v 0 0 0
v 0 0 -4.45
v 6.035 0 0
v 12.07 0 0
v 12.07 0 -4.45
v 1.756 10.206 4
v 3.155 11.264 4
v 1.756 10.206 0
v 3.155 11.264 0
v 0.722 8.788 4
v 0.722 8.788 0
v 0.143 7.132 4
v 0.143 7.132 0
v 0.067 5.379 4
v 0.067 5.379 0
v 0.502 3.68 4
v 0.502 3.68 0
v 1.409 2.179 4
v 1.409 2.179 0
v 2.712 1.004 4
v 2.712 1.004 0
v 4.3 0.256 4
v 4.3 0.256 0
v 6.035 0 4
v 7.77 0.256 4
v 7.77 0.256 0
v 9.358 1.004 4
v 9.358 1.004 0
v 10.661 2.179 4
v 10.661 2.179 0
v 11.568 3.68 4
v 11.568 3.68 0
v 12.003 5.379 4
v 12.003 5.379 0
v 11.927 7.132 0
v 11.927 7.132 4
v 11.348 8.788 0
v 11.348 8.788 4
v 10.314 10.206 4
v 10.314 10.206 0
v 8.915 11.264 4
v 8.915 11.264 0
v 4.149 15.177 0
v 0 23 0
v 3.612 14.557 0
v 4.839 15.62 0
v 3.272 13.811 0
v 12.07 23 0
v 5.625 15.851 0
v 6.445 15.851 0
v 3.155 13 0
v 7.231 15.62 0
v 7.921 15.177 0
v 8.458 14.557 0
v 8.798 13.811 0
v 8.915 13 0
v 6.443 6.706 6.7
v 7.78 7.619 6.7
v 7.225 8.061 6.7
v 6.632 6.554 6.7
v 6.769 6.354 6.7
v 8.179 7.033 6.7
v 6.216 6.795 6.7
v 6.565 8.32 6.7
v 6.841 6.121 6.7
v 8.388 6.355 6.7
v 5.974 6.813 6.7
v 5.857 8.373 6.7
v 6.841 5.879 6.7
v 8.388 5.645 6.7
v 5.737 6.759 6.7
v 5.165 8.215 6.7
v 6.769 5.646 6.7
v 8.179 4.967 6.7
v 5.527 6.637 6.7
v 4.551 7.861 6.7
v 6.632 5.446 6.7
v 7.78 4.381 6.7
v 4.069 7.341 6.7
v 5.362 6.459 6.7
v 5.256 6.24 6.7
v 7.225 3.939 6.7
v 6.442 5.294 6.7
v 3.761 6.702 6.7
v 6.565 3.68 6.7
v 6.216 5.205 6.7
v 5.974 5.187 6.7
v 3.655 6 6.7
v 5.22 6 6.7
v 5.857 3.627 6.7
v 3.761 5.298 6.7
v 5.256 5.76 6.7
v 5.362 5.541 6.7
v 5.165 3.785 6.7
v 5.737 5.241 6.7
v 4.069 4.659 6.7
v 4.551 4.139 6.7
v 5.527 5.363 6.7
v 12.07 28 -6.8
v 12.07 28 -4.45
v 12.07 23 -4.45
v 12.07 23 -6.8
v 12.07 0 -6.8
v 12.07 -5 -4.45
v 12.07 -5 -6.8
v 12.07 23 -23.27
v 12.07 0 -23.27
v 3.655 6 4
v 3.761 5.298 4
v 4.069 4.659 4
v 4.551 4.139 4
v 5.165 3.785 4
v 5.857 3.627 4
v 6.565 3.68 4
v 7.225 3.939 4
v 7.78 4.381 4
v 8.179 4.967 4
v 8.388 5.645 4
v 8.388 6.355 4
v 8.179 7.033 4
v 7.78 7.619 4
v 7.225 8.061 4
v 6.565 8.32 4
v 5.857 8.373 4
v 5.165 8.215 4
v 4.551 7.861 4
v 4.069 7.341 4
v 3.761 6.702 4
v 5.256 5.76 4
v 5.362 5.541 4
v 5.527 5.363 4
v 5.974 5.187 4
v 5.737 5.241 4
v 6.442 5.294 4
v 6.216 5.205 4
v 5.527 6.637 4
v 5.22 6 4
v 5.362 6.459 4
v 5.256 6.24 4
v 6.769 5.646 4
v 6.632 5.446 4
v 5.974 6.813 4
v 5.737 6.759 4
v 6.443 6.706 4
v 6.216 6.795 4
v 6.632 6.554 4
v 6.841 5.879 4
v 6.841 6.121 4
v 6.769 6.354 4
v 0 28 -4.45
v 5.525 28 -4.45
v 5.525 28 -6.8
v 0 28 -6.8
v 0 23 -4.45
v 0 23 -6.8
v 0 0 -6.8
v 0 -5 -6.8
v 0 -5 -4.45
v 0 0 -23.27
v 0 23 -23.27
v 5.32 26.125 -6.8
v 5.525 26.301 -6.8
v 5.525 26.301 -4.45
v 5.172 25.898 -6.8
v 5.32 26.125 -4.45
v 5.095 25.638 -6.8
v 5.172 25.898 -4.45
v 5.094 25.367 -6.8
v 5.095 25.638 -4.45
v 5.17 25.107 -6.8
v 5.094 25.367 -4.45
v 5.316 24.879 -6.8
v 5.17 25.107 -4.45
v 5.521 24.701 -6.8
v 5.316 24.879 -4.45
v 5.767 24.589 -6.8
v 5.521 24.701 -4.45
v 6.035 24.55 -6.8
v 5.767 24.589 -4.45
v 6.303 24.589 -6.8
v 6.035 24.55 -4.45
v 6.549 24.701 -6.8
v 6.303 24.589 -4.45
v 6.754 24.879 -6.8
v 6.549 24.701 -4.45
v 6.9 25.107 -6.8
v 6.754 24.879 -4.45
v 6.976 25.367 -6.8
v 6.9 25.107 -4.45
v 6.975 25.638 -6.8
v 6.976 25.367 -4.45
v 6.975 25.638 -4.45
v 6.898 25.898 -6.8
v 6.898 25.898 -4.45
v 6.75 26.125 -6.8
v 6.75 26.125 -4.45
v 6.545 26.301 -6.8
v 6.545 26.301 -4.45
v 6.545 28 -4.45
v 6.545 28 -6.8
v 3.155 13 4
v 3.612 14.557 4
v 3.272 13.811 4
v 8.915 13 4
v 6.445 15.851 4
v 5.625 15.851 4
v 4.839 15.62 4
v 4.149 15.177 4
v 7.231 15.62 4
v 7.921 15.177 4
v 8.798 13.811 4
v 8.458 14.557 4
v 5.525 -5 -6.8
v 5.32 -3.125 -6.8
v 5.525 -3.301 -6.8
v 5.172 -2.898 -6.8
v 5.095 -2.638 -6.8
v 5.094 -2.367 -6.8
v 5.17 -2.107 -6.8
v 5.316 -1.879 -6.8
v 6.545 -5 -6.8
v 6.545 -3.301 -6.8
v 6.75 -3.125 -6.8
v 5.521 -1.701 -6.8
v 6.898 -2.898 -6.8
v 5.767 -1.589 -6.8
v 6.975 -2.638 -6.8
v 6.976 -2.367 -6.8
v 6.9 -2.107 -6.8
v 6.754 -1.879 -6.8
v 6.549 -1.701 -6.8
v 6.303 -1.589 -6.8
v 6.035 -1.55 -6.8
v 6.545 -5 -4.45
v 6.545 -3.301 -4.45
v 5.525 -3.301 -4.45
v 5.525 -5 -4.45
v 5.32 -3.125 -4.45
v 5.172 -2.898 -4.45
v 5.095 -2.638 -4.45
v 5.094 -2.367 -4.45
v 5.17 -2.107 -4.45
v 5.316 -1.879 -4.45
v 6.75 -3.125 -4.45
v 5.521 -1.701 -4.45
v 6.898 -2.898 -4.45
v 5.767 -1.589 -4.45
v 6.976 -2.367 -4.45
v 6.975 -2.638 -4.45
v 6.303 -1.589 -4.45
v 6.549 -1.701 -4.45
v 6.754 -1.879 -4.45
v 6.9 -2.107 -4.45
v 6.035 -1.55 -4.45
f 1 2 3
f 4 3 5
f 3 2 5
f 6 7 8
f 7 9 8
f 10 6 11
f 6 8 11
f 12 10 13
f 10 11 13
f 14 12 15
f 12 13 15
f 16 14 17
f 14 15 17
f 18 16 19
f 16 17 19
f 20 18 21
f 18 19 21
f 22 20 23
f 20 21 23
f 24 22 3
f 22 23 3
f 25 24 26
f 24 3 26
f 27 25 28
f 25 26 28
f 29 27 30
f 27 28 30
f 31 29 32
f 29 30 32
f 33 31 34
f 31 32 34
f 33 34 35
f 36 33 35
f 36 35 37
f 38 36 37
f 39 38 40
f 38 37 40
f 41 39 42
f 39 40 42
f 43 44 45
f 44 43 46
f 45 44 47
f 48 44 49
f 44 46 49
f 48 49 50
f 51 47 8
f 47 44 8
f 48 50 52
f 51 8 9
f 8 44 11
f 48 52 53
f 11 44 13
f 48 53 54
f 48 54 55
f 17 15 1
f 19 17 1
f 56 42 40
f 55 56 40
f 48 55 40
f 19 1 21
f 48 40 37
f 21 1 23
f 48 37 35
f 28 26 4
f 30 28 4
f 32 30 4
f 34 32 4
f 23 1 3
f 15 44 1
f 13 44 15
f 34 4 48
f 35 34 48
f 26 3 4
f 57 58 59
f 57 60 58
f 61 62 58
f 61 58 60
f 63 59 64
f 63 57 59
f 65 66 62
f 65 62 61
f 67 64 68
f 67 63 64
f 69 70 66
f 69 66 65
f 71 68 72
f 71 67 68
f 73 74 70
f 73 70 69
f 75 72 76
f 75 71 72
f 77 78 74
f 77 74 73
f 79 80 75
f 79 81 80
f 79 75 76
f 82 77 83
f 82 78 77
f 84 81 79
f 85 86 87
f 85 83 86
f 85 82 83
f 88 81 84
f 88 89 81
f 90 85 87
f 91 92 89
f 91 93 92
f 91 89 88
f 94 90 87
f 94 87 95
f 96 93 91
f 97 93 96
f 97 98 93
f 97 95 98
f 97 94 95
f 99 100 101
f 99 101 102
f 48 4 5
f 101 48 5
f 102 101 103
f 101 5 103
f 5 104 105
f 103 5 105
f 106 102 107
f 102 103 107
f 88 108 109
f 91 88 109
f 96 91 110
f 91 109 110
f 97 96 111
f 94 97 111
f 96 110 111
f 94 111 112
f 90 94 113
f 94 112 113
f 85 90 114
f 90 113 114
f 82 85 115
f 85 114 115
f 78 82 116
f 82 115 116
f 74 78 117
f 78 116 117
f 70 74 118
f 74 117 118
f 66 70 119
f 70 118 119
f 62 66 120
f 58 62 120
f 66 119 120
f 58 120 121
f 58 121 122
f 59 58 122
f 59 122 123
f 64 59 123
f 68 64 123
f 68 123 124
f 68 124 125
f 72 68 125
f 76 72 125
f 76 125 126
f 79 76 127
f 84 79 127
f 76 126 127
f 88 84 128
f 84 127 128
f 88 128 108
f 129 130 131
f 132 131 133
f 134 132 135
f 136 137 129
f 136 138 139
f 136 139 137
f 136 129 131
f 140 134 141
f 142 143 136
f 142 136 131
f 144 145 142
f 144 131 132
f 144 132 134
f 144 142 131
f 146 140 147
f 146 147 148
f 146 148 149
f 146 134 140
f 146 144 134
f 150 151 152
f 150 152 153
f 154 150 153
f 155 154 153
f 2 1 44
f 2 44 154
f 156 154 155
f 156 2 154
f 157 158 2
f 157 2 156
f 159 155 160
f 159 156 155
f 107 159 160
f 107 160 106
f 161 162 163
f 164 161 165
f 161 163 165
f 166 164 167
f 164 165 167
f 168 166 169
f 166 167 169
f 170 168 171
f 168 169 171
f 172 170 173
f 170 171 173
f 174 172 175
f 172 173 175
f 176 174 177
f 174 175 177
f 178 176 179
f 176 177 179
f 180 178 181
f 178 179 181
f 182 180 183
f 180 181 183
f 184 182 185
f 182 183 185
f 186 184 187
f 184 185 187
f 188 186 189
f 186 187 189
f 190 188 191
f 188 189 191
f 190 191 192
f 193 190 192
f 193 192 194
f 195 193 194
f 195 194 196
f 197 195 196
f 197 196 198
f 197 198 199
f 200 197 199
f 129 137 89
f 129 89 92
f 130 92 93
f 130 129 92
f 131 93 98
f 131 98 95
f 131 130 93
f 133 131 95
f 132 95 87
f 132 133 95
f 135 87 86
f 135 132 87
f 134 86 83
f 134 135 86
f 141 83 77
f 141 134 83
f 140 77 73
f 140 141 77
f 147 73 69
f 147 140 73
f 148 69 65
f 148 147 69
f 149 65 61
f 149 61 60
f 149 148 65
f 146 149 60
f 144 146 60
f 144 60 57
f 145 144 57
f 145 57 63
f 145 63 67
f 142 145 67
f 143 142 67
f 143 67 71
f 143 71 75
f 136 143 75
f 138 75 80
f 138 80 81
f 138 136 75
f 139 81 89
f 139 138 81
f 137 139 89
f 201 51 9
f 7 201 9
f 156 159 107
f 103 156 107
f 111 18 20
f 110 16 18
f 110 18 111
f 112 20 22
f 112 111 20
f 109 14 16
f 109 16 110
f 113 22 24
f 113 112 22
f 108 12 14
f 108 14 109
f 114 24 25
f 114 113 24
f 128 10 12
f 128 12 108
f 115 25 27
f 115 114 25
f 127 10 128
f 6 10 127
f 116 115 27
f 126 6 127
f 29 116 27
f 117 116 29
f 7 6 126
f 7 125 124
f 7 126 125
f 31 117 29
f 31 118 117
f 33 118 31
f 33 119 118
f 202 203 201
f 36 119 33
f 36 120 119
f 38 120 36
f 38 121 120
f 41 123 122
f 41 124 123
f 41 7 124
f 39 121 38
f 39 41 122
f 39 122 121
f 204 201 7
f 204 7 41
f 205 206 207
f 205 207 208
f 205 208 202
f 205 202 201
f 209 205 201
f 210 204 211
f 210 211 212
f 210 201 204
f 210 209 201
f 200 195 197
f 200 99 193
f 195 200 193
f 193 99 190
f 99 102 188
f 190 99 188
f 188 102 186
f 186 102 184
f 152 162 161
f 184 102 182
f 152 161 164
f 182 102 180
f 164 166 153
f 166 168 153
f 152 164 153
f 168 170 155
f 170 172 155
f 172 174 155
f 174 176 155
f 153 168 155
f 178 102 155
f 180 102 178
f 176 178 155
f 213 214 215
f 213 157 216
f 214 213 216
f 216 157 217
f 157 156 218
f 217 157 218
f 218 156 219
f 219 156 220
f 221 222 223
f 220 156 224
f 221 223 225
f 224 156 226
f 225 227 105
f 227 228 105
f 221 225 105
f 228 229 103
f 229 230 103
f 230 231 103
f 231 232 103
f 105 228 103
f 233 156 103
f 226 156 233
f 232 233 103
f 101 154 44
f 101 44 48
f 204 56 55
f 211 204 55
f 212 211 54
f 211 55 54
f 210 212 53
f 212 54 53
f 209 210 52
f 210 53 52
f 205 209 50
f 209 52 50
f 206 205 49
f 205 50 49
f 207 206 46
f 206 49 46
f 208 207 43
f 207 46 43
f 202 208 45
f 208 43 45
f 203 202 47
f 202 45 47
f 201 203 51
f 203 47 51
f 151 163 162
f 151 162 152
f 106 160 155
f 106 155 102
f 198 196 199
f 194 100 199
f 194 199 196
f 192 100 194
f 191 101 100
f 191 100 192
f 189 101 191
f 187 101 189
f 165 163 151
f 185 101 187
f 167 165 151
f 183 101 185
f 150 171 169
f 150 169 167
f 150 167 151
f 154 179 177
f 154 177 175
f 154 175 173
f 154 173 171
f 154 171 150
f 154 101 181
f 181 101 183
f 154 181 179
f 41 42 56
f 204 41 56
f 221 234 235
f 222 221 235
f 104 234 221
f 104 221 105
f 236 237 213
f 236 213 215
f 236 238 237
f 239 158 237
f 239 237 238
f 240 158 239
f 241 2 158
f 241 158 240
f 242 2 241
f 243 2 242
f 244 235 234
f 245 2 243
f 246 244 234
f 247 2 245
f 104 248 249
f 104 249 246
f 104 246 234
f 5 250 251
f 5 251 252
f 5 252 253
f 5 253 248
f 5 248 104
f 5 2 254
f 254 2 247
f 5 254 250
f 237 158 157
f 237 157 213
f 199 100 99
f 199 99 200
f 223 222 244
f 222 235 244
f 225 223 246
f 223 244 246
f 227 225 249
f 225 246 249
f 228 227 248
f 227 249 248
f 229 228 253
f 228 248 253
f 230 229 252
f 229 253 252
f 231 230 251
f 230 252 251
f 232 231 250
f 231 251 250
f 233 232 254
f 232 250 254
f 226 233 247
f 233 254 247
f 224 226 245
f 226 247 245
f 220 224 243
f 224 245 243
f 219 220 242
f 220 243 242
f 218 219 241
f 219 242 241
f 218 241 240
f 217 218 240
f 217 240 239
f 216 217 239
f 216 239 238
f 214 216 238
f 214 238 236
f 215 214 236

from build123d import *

# Parameters (mm, degrees)
SKETCH1_W           = 12.07
SKETCH1_H           = 23.27
BOSS_EXTRUDE1_DEPTH = 23
SKETCH2_R           = 6
BOSS_EXTRUDE3_DEPTH = 4
BOSS_EXTRUDE4_DEPTH = 4
SKETCH6_W           = 12.07
SKETCH6_H           = 2.35
BOSS_EXTRUDE5_DEPTH = 5
SKETCH7_W           = 12.07
SKETCH7_H           = 2.35
BOSS_EXTRUDE6_DEPTH = 5
SKETCH8_R           = 0.95
CUT_EXTRUDE1_DEPTH  = 36.831233582
SKETCH9_W           = 1.02
SKETCH9_H           = 2.5
CUT_EXTRUDE2_DEPTH  = 36.831233582
SKETCH10_R          = 2.38
SKETCH10_R_2        = 0.815
BOSS_EXTRUDE7_DEPTH = 2.7


with BuildPart() as part:
    # Sketch1 → Boss-Extrude1 (new body)
    with BuildSketch(Plane(origin=(0, 0, 0), x_dir=(1, 0, 0), z_dir=(0, 1, 0))):
        with Locations((6.035, 11.635)):
            Rectangle(SKETCH1_W, SKETCH1_H)
    extrude(amount=BOSS_EXTRUDE1_DEPTH)

    # Sketch2 → Boss-Extrude3 (add)
    with BuildSketch(Plane.XY):
        with Locations(Location((6.035, 6, 0), (0, 0, 270))):
            Circle(SKETCH2_R)
    extrude(amount=BOSS_EXTRUDE3_DEPTH)

    # Sketch4 → Boss-Extrude4 (add)
    with BuildSketch(Plane.XY):
        with BuildLine():
            Line((3.155, 13), (3.155, 11.263610928))
            Line((3.155, 11.263610928), (8.915, 11.263610928))
            Line((8.915, 11.263610928), (8.915, 13))
            ThreePointArc((8.915, 13), (6.035, 15.88), (3.155, 13))
        make_face()
    extrude(amount=BOSS_EXTRUDE4_DEPTH)

    # Sketch6 → Boss-Extrude5 (add)
    with BuildSketch(Plane.XZ):
        with Locations((6.035, -5.625)):
            Rectangle(SKETCH6_W, SKETCH6_H)
    extrude(amount=BOSS_EXTRUDE5_DEPTH)

    # Sketch7 → Boss-Extrude6 (add)
    with BuildSketch(Plane(origin=(0, 23, 0), x_dir=(-1, 0, 0), z_dir=(0, 1, 0))):
        with Locations((-6.035, -5.625)):
            Rectangle(SKETCH7_W, SKETCH7_H)
    extrude(amount=BOSS_EXTRUDE6_DEPTH)

    # Sketch8 → Cut-Extrude1 (cut, through all)
    with BuildSketch(Plane.XY.offset(-4.45)):
        with Locations((6.035, 25.5)):
            Circle(SKETCH8_R)
        with Locations((6.035, -2.5)):
            Circle(SKETCH8_R)
    extrude(amount=-CUT_EXTRUDE1_DEPTH, mode=Mode.SUBTRACT)

    # Sketch9 → Cut-Extrude2 (cut, through all)
    with BuildSketch(Plane.XY.offset(-4.45)):
        with Locations((6.035, 26.75)):
            Rectangle(SKETCH9_W, SKETCH9_H)
        with Locations((6.035, -3.75)):
            Rectangle(SKETCH9_W, SKETCH9_H)
    extrude(amount=-CUT_EXTRUDE2_DEPTH, mode=Mode.SUBTRACT)

    # Sketch10 → Boss-Extrude7 (add)
    with BuildSketch(Plane.XY.offset(4)):
        with Locations(Location((6.035, 6, 0), (0, 0, 180))):
            Circle(SKETCH10_R)
        with Locations(Location((6.035, 6, 0), (0, 0, 180))):
            Circle(SKETCH10_R_2, mode=Mode.SUBTRACT)
    extrude(amount=BOSS_EXTRUDE7_DEPTH)


solid = part.part
